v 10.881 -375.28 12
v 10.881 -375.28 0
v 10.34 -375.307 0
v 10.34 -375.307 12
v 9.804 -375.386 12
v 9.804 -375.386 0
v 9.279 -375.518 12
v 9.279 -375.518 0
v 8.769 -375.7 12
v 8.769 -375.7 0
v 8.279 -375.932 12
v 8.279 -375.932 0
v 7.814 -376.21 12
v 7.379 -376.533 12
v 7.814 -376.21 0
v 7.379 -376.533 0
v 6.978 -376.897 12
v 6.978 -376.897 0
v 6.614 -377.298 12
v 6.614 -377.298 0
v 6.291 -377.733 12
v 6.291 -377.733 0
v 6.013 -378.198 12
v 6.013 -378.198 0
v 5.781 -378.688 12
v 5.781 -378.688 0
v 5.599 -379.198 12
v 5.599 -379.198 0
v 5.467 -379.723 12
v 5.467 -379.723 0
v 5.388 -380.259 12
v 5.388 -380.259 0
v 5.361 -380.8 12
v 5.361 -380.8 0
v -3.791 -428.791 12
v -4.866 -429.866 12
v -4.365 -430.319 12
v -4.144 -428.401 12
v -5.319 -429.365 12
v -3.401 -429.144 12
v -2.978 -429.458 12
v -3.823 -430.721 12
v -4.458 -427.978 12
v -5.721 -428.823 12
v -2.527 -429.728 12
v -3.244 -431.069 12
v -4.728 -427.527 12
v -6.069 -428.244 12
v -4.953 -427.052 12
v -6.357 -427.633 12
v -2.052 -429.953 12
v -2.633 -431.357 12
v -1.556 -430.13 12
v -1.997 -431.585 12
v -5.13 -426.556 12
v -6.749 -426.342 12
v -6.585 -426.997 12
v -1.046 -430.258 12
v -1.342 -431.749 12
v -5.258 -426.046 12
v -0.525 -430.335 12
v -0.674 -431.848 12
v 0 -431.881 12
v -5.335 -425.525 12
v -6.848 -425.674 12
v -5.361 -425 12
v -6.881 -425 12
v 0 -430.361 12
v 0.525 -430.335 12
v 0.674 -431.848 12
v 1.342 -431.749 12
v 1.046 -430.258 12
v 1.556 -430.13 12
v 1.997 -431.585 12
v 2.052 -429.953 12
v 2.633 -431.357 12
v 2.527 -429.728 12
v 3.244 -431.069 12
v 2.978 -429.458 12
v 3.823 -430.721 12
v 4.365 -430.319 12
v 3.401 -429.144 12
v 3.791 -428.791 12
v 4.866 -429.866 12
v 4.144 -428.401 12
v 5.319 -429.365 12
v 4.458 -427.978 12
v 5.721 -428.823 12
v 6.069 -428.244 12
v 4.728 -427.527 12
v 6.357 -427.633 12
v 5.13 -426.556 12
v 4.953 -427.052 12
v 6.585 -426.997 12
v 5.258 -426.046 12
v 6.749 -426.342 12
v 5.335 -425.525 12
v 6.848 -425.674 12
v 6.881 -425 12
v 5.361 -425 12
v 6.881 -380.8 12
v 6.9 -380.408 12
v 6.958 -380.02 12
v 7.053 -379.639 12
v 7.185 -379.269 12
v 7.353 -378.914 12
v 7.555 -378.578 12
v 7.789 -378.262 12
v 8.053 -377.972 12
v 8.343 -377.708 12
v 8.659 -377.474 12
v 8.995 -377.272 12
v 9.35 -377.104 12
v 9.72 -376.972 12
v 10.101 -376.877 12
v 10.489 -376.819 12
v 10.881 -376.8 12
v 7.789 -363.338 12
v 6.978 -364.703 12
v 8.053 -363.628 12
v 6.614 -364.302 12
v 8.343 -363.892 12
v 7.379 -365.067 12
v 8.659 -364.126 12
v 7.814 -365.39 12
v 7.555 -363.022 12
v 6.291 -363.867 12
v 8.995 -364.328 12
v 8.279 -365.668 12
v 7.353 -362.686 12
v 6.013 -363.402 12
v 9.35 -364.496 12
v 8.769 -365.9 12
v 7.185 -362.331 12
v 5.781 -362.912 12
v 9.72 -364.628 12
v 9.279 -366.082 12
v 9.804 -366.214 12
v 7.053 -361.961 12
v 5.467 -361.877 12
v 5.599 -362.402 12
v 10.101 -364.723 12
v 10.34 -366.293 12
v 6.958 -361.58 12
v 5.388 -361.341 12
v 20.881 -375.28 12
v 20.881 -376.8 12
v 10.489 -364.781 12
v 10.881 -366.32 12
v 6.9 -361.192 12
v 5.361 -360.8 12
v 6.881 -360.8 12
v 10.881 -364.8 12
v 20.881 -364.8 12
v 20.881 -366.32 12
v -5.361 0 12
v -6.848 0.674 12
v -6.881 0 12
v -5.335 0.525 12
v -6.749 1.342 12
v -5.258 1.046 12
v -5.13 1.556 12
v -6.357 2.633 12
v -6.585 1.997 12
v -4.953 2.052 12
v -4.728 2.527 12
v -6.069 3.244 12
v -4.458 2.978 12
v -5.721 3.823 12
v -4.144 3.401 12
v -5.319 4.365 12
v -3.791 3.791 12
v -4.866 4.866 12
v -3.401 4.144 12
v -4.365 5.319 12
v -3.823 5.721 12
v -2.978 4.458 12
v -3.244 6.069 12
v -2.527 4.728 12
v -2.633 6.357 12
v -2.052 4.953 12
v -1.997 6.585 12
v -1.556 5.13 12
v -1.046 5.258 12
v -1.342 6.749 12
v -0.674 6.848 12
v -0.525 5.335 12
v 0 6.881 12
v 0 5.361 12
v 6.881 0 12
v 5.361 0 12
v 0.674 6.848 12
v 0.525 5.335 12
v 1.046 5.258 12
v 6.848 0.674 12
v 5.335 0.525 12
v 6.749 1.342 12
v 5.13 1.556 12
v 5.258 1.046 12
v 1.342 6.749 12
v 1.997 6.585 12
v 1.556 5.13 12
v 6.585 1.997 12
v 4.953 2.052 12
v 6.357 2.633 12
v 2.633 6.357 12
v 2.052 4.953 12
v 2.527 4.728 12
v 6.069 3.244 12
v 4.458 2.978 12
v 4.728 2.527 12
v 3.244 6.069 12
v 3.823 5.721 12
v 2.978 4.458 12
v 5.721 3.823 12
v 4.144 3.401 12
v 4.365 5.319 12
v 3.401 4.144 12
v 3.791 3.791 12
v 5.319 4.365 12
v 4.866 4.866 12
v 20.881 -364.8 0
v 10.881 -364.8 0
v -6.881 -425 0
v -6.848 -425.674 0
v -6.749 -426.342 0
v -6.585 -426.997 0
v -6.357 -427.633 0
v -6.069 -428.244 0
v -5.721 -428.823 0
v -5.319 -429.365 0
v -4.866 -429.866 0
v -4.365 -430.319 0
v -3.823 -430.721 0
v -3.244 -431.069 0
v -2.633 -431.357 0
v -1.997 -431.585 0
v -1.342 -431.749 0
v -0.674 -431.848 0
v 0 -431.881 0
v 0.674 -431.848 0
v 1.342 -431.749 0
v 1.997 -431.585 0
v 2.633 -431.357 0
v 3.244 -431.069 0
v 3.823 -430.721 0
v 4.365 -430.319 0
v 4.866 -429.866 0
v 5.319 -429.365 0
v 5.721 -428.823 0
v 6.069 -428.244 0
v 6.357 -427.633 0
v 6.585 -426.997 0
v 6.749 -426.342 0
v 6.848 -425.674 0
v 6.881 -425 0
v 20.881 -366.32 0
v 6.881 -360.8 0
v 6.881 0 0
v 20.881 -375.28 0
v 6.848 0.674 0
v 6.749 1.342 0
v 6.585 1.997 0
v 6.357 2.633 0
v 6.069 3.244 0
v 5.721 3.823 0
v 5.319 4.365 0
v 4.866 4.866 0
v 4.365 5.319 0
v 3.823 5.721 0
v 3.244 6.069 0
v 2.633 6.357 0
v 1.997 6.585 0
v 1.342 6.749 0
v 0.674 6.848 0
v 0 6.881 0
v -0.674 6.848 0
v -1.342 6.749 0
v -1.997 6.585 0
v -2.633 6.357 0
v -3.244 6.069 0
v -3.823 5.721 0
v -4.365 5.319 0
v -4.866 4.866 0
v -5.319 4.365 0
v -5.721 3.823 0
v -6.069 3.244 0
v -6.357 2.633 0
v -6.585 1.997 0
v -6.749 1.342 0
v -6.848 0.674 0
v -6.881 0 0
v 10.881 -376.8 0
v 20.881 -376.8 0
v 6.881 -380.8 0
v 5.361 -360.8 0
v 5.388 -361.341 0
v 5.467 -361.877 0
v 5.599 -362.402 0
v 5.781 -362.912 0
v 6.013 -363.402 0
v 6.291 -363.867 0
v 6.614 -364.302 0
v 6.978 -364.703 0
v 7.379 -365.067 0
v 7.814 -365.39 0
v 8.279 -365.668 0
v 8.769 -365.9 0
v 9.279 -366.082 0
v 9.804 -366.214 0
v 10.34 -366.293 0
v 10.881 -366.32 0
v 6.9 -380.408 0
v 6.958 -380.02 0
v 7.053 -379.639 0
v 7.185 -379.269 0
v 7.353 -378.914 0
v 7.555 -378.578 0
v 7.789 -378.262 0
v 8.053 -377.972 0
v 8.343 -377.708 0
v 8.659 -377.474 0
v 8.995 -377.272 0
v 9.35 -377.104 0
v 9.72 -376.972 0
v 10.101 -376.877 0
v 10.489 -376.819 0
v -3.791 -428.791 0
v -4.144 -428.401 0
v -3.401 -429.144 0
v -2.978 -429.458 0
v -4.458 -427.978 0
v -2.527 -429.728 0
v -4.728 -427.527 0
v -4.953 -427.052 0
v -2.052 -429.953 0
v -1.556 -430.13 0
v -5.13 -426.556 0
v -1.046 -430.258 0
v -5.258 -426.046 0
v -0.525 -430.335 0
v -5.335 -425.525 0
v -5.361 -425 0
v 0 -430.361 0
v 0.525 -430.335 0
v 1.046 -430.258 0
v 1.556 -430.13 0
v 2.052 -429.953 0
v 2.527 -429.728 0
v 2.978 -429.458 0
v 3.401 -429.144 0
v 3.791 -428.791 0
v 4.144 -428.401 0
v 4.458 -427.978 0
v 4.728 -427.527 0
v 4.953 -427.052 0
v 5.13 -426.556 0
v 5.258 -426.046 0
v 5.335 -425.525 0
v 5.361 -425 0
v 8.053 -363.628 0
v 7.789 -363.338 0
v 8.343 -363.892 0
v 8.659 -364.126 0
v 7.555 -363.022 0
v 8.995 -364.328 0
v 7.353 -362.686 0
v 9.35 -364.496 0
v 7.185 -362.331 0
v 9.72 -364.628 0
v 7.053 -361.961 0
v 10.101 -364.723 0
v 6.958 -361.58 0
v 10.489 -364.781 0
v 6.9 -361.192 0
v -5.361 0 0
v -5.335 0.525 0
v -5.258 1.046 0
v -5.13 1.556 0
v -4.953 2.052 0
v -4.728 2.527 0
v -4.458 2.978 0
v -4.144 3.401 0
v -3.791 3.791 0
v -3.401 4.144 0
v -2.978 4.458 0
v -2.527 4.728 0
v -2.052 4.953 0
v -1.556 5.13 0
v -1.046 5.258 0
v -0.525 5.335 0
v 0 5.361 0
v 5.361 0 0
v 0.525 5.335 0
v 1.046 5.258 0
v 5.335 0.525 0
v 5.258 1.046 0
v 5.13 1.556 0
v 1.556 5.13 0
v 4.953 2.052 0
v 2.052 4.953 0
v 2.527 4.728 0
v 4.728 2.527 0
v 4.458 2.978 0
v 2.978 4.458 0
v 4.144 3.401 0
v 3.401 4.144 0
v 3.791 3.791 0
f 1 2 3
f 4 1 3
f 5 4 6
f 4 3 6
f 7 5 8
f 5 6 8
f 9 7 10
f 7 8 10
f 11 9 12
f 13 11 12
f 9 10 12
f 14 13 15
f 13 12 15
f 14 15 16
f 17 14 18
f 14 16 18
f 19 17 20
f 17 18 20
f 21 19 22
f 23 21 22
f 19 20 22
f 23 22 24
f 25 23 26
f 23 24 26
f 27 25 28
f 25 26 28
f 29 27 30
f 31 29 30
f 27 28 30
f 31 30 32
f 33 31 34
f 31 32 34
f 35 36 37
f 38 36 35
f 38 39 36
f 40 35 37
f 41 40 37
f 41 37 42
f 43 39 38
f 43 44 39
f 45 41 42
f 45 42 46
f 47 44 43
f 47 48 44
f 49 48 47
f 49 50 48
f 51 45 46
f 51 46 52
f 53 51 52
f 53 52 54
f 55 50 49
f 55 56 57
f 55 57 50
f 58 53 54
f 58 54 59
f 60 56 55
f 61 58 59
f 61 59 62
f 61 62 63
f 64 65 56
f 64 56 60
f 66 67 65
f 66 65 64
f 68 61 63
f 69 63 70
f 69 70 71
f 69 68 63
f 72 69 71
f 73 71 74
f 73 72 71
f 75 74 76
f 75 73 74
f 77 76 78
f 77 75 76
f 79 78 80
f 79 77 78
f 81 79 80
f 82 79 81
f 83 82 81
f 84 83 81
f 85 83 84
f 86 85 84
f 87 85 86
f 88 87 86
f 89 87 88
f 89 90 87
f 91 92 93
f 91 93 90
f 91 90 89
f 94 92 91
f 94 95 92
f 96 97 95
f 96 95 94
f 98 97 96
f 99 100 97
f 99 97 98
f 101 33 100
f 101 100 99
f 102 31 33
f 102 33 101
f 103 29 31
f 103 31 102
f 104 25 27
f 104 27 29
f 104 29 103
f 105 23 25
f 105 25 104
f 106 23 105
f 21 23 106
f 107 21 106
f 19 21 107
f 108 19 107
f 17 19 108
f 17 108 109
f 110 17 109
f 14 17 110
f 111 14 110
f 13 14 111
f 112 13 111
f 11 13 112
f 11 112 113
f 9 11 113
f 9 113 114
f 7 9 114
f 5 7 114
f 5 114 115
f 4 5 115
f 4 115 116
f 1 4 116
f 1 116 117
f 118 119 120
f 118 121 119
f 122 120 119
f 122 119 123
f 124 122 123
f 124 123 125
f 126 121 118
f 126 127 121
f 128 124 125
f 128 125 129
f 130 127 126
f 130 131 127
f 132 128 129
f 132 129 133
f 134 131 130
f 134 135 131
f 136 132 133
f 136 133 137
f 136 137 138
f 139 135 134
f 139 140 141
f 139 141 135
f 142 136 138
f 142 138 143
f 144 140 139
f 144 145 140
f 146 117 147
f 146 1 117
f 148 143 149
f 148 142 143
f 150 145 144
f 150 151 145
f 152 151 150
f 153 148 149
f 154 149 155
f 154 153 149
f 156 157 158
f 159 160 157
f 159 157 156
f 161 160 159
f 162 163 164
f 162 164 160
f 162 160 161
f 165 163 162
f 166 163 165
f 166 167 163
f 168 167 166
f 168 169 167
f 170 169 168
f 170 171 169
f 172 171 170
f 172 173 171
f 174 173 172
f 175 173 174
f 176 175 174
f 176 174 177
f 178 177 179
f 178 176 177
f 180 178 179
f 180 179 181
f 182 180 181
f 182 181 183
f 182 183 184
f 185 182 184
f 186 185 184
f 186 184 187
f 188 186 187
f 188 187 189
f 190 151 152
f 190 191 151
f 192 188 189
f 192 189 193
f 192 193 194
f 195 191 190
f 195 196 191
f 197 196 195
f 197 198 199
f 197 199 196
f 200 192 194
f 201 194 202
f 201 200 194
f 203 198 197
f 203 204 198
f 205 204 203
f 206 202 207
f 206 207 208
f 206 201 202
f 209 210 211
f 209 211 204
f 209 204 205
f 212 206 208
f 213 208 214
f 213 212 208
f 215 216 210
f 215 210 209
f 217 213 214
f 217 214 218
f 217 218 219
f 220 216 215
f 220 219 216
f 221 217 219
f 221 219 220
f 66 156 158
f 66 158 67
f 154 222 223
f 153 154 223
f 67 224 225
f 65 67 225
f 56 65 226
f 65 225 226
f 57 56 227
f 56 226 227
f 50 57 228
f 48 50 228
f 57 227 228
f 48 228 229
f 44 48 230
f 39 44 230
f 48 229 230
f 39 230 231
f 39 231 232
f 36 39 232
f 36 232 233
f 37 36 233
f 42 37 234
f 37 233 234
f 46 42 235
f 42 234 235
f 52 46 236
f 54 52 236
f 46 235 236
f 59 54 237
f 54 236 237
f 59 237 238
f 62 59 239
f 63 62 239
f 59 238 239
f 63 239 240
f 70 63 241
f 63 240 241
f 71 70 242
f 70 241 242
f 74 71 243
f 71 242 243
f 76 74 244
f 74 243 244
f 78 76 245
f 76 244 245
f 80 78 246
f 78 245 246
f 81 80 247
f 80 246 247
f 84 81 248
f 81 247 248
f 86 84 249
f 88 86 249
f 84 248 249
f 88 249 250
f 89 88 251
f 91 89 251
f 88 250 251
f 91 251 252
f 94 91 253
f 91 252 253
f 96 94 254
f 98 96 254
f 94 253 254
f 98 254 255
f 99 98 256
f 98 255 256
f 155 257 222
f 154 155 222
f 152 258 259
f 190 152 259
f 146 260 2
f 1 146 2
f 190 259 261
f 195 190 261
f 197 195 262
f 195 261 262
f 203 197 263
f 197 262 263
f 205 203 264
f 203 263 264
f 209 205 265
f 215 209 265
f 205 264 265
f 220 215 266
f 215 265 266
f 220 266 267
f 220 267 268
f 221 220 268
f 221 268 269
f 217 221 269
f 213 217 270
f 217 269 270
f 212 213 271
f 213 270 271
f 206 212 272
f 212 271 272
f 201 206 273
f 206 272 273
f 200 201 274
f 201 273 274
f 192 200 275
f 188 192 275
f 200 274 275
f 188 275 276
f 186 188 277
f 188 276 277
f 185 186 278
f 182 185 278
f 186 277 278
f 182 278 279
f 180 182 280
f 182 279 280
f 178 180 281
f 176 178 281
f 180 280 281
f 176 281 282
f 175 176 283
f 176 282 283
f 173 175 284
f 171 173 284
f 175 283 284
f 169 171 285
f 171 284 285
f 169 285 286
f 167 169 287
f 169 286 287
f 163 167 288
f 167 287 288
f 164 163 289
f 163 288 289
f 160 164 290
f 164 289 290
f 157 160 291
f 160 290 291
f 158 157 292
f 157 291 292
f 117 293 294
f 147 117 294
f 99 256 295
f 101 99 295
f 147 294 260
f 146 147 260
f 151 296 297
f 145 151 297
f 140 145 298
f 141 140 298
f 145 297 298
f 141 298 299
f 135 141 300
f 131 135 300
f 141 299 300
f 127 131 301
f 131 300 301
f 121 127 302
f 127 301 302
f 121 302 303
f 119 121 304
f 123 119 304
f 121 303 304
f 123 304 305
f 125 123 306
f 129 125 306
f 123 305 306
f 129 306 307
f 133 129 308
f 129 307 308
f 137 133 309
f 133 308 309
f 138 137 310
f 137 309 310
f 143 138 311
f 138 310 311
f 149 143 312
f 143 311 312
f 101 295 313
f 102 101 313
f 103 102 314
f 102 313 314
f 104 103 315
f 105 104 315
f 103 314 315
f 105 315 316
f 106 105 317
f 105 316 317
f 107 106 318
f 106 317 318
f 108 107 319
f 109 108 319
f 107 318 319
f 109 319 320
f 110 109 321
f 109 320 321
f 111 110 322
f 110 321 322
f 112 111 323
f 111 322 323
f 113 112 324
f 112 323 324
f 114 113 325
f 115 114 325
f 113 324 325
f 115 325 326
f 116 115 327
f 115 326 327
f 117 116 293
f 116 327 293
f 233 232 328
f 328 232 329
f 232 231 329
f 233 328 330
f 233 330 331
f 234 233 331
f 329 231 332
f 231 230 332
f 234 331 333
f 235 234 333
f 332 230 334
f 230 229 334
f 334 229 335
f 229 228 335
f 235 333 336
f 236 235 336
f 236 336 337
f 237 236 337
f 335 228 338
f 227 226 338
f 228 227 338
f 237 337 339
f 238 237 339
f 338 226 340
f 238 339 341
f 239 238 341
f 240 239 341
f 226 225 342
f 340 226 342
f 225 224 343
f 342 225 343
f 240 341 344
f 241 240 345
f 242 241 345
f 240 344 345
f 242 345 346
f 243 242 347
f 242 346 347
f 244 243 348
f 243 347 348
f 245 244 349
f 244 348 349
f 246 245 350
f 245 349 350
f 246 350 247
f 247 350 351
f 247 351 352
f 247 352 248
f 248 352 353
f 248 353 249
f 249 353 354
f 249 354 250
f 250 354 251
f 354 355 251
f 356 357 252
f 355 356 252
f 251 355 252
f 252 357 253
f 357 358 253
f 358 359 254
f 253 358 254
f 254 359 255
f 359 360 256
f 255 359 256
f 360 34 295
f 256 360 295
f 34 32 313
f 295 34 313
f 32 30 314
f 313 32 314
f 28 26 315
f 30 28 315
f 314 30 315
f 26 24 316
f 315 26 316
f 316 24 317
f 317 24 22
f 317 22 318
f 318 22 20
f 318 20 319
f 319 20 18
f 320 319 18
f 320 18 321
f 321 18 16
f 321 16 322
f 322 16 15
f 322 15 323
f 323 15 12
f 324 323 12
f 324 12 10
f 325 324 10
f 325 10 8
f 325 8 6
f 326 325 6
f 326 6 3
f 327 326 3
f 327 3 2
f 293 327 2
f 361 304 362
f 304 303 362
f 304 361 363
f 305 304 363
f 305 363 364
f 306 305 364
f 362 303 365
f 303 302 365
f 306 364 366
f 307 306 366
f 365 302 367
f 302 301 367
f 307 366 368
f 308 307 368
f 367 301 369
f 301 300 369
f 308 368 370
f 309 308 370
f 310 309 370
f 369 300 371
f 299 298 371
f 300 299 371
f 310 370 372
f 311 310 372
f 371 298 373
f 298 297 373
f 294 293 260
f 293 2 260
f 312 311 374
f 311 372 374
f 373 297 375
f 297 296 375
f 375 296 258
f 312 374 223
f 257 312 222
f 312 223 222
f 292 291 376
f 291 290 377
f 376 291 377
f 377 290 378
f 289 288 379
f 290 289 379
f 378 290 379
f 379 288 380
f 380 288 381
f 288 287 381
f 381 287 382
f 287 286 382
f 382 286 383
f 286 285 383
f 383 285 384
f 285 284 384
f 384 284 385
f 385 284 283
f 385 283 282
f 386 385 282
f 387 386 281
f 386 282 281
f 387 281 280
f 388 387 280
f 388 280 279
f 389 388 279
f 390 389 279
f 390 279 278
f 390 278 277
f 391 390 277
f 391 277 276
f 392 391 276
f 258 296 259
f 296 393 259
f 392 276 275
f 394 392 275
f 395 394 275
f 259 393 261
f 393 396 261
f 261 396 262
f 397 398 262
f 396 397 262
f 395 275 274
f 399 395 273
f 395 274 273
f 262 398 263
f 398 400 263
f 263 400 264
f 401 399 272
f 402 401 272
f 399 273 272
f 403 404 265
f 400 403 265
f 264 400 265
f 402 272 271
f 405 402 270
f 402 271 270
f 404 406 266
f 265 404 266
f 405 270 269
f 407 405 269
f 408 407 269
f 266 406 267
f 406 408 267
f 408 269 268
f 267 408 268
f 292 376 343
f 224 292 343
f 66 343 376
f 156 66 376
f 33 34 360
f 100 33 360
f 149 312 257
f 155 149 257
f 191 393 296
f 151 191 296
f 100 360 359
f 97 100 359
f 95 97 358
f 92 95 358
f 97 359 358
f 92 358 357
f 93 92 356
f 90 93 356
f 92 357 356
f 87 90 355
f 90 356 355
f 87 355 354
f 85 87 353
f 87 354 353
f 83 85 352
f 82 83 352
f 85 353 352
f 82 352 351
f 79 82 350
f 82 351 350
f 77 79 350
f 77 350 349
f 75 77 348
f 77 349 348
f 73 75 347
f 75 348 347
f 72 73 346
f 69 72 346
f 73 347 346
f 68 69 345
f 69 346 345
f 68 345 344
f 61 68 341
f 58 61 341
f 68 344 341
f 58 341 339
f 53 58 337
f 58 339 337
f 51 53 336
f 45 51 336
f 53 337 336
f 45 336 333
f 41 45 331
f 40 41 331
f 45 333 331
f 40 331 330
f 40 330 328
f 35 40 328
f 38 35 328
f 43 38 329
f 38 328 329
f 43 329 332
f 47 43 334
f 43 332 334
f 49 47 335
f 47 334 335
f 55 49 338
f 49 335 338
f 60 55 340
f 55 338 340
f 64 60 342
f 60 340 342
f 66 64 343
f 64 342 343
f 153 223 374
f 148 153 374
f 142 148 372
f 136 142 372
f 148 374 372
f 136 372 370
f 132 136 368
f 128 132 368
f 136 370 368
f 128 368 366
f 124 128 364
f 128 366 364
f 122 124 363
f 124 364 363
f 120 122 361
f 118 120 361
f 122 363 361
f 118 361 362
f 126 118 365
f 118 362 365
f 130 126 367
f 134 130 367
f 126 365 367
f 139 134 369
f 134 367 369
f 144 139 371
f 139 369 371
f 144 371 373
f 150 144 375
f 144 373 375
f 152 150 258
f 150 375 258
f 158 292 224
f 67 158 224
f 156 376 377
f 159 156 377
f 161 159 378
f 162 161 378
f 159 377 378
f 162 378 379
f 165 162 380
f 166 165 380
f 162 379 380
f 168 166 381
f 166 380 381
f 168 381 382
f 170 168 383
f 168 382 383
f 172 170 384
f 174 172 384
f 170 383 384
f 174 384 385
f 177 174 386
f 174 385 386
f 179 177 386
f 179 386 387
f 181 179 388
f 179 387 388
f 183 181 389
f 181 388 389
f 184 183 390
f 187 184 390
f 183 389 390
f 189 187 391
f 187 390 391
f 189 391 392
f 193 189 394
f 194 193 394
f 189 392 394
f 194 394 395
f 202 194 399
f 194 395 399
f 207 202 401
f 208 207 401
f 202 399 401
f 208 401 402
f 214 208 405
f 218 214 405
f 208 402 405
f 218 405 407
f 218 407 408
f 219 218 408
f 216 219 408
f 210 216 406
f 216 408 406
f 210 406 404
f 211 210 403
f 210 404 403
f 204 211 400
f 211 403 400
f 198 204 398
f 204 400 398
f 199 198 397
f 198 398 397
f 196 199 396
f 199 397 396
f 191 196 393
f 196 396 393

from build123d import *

# Parameters (mm, degrees)
EXTRUDE_THIN1_DEPTH = 12


with BuildPart() as part:
    # Sketch1 → Extrude-Thin1 (new body)
    with BuildSketch(Plane.XY):
        with BuildLine():
            Line((20.881, -364.8), (10.881, -364.8))
            ThreePointArc((10.881, -364.8), (8.052572875, -363.628427125), (6.881, -360.8))
            Line((6.881, -360.8), (6.881, 0))
            ThreePointArc((6.881, 0), (0, 6.881), (-6.881, 0))
            Line((-6.881, 0), (-6.881, -425))
            ThreePointArc((-6.881, -425), (0, -431.881), (6.881, -425))
            Line((6.881, -425), (6.881, -380.8))
            ThreePointArc((6.881, -380.8), (8.052572875, -377.971572875), (10.881, -376.8))
            Line((10.881, -376.8), (20.881, -376.8))
            Line((20.881, -376.8), (20.881, -375.28))
            Line((20.881, -375.28), (10.881, -375.28))
            ThreePointArc((10.881, -375.28), (6.977770568, -376.896770568), (5.361, -380.8))
            Line((5.361, -380.8), (5.361, -425))
            ThreePointArc((5.361, -425), (0, -430.361), (-5.361, -425))
            Line((-5.361, -425), (-5.361, 0))
            ThreePointArc((-5.361, 0), (0, 5.361), (5.361, 0))
            Line((5.361, 0), (5.361, -360.8))
            ThreePointArc((5.361, -360.8), (6.977770568, -364.703229432), (10.881, -366.32))
            Line((10.881, -366.32), (20.881, -366.32))
            Line((20.881, -366.32), (20.881, -364.8))
        make_face()
    extrude(amount=EXTRUDE_THIN1_DEPTH)


solid = part.part
